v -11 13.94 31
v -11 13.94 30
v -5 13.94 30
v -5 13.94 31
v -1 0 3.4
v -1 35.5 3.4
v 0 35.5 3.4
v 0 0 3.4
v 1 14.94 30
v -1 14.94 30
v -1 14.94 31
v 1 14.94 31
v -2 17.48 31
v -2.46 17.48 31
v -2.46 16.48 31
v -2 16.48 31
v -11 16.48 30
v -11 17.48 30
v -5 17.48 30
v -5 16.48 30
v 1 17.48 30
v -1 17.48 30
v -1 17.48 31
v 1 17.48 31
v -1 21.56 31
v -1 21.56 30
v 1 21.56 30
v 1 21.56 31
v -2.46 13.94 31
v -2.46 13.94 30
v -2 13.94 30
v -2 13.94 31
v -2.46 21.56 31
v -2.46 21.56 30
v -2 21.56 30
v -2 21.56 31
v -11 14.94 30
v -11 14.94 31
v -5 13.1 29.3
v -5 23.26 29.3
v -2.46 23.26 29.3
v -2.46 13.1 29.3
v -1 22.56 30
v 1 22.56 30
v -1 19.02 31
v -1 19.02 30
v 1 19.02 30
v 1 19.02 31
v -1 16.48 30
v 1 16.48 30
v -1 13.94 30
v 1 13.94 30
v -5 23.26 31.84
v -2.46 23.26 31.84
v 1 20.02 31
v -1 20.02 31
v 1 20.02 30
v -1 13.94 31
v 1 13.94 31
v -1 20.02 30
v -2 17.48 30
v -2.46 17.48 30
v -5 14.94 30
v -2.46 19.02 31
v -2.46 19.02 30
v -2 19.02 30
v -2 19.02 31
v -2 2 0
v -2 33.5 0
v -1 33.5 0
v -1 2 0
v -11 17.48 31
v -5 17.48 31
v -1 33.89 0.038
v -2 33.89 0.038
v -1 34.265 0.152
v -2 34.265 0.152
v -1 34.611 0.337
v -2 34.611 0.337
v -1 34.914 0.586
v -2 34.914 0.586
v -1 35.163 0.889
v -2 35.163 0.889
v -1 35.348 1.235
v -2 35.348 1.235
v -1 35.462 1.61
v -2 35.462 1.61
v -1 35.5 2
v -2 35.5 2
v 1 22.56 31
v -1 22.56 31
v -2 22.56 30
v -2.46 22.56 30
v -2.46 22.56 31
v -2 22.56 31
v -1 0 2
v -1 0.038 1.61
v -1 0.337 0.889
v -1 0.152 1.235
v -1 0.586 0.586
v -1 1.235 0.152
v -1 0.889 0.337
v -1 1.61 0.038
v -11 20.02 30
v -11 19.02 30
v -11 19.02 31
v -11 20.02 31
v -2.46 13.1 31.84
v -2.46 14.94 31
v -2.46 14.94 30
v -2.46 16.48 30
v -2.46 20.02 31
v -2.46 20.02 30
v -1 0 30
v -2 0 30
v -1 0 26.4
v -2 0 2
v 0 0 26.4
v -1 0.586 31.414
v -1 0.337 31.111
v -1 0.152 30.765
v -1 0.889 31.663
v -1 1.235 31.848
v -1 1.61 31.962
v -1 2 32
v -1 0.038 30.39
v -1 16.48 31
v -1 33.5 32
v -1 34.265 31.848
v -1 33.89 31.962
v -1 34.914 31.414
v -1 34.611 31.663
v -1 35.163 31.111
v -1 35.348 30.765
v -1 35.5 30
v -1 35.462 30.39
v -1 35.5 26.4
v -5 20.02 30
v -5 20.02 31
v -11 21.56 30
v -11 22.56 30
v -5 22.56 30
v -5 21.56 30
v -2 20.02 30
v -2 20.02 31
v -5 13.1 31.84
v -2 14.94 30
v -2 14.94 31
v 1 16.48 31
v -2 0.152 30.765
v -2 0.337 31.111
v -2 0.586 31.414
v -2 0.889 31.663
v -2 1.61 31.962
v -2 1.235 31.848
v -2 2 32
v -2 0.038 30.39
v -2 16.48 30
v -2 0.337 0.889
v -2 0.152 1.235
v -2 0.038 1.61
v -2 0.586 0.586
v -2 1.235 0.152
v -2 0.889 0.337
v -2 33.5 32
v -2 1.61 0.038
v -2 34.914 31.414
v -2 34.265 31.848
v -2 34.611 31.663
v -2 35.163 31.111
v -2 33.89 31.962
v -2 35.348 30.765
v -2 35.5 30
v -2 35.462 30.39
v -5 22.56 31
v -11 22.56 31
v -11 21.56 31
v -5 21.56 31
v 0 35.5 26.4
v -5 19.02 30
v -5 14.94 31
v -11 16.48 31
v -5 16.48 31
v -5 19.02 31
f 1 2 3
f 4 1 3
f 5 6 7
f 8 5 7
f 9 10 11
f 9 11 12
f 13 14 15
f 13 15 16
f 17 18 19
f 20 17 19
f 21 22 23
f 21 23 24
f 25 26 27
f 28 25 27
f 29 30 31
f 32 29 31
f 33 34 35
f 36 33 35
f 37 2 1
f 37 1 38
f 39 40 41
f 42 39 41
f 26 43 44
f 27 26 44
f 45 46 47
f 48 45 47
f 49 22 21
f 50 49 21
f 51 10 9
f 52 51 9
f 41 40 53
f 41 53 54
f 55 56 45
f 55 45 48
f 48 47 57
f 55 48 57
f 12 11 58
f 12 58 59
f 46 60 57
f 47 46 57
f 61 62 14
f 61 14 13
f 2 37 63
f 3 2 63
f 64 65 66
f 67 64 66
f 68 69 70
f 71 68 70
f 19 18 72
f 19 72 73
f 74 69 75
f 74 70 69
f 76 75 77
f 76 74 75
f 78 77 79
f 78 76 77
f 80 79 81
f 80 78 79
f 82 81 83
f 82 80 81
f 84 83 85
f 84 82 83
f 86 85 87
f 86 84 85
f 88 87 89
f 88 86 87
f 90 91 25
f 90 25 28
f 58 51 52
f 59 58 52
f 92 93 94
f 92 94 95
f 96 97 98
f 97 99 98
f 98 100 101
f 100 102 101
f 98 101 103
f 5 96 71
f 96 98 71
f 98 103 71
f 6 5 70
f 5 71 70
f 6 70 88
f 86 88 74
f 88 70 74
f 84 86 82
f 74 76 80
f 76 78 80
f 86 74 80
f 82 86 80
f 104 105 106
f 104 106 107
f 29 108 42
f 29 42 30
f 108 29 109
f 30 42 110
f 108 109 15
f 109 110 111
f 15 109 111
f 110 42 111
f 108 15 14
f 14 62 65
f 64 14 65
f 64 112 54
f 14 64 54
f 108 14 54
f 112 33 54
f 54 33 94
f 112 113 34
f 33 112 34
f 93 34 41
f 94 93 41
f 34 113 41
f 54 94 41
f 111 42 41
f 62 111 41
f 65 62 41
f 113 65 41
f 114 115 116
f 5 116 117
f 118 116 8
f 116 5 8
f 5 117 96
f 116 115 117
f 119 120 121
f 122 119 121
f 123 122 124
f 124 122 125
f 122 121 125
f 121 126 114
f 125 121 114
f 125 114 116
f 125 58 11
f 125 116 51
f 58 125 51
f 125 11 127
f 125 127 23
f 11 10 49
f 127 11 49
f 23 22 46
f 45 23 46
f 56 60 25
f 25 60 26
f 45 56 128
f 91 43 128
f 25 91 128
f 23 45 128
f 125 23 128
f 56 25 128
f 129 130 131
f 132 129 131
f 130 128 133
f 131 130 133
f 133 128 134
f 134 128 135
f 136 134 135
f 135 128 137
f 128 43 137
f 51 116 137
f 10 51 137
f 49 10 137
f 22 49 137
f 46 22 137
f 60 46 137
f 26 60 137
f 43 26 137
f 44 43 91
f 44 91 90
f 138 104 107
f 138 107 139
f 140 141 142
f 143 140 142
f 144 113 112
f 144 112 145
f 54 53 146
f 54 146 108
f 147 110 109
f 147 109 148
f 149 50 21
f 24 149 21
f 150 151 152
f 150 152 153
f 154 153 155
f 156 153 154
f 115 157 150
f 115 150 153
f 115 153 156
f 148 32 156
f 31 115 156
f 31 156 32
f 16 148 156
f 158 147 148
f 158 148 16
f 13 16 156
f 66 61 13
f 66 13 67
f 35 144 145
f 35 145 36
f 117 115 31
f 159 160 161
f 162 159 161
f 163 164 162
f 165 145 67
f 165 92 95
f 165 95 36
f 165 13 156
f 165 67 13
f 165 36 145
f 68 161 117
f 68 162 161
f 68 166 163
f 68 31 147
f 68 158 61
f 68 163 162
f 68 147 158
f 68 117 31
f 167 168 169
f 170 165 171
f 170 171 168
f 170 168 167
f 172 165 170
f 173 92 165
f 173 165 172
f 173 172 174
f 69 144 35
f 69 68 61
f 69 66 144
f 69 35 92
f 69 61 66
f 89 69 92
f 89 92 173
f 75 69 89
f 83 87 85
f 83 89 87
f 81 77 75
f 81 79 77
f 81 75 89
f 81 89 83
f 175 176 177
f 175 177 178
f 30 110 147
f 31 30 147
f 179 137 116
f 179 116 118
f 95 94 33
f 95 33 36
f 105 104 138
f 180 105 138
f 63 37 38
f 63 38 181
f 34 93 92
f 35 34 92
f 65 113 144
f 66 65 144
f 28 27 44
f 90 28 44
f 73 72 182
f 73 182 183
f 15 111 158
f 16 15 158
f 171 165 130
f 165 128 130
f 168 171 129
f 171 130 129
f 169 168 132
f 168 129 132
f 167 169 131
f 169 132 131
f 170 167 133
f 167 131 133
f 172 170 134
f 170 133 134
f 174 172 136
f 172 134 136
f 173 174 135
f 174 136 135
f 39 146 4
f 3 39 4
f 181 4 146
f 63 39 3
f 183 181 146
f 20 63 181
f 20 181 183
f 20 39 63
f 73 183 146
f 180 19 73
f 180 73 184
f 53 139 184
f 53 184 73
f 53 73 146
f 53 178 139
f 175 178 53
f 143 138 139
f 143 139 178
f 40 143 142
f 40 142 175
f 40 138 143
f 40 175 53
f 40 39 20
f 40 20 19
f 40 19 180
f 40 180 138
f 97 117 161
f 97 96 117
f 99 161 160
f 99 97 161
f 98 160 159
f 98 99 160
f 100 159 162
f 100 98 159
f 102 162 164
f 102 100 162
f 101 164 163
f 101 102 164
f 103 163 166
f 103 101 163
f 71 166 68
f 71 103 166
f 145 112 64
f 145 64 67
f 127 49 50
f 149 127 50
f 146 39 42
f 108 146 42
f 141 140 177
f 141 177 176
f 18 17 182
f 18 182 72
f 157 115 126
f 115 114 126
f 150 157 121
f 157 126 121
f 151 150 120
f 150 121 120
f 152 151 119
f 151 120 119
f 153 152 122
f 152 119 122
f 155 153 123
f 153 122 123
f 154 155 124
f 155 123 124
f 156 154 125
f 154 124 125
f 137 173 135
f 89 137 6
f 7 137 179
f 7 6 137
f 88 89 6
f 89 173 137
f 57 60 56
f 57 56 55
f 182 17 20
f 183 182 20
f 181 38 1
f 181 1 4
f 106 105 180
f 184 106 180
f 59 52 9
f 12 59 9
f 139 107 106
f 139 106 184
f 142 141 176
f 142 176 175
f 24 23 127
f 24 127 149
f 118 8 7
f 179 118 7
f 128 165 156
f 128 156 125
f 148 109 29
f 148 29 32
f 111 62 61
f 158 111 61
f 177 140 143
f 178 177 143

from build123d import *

# Parameters (mm, degrees)
BOX003001_W           = 2.54
BOX003001_H           = 2.54
BOX003001_DEPTH       = 2.54
BOX002001_W           = 12
BOX002001_H           = 1
BOX002001_DEPTH       = 1
BOX003001001_W        = 2.54
BOX003001001_H        = 2.54
BOX003001001_DEPTH    = 2.54
BOX002001001_W        = 12
BOX002001001_H        = 1
BOX002001001_DEPTH    = 1
BOX003001001001_W     = 2.54
BOX003001001001_H     = 2.54
BOX003001001001_DEPTH = 2.54
BOX002001001001_W     = 12
BOX002001001001_H     = 1
BOX002001001001_DEPTH = 1
BOX003_W              = 2.54
BOX003_H              = 2.54
BOX003_DEPTH          = 2.54
BOX002_W              = 12
BOX002_H              = 1
BOX002_DEPTH          = 1
BOX_W                 = 1
BOX_H                 = 35.5
BOX_DEPTH             = 32
FILLET_R              = 2
FILLET001_R           = 2
FILLET002_R           = 2
FILLET003_R           = 2
BOX001_W              = 1
BOX001_H              = 35.5
BOX001_DEPTH          = 23


with BuildPart() as housing001:
    # Box003001 → Box003001 (new body)
    with BuildSketch(Plane(origin=(-5, 13.1, 29.3), x_dir=(1, 0, 0), z_dir=(0, 0, 1))):
        with Locations((1.27, 1.27)):
            Rectangle(BOX003001_W, BOX003001_H)
    extrude(amount=BOX003001_DEPTH)


with BuildPart() as pin003:
    # Box002001 → Box002001 (new body)
    with BuildSketch(Plane(origin=(-11, 13.94, 30), x_dir=(1, 0, 0), z_dir=(0, 0, 1))):
        with Locations((6, 0.5)):
            Rectangle(BOX002001_W, BOX002001_H)
    extrude(amount=BOX002001_DEPTH)

    # Fusion001: union Housing001
    add(housing001.part)


with BuildPart() as pin003_1:
    # Fusion001 placement: moved
    add(pin003.part.moved(Location((0, 2.54, 0))))


with BuildPart() as housing002:
    # Box003001001 → Box003001001 (new body)
    with BuildSketch(Plane(origin=(-5, 13.1, 29.3), x_dir=(1, 0, 0), z_dir=(0, 0, 1))):
        with Locations((1.27, 1.27)):
            Rectangle(BOX003001001_W, BOX003001001_H)
    extrude(amount=BOX003001001_DEPTH)


with BuildPart() as pin004:
    # Box002001001 → Box002001001 (new body)
    with BuildSketch(Plane(origin=(-11, 13.94, 30), x_dir=(1, 0, 0), z_dir=(0, 0, 1))):
        with Locations((6, 0.5)):
            Rectangle(BOX002001001_W, BOX002001001_H)
    extrude(amount=BOX002001001_DEPTH)

    # Fusion001001: union Housing002
    add(housing002.part)


with BuildPart() as pin004_1:
    # Fusion001001 placement: moved
    add(pin004.part.moved(Location((0, 5.08, 0))))


with BuildPart() as housing003:
    # Box003001001001 → Box003001001001 (new body)
    with BuildSketch(Plane(origin=(-5, 13.1, 29.3), x_dir=(1, 0, 0), z_dir=(0, 0, 1))):
        with Locations((1.27, 1.27)):
            Rectangle(BOX003001001001_W, BOX003001001001_H)
    extrude(amount=BOX003001001001_DEPTH)


with BuildPart() as pin006:
    # Box002001001001 → Box002001001001 (new body)
    with BuildSketch(Plane(origin=(-11, 13.94, 30), x_dir=(1, 0, 0), z_dir=(0, 0, 1))):
        with Locations((6, 0.5)):
            Rectangle(BOX002001001001_W, BOX002001001001_H)
    extrude(amount=BOX002001001001_DEPTH)

    # Fusion001001001: union Housing003
    add(housing003.part)


with BuildPart() as pin006_1:
    # Fusion001001001 placement: moved
    add(pin006.part.moved(Location((0, 7.62, 0))))


with BuildPart() as housing:
    # Box003 → Box003 (new body)
    with BuildSketch(Plane(origin=(-5, 13.1, 29.3), x_dir=(1, 0, 0), z_dir=(0, 0, 1))):
        with Locations((1.27, 1.27)):
            Rectangle(BOX003_W, BOX003_H)
    extrude(amount=BOX003_DEPTH)


with BuildPart() as pins:
    # Box002 → Box002 (new body)
    with BuildSketch(Plane(origin=(-11, 13.94, 30), x_dir=(1, 0, 0), z_dir=(0, 0, 1))):
        with Locations((6, 0.5)):
            Rectangle(BOX002_W, BOX002_H)
    extrude(amount=BOX002_DEPTH)

    # Fusion: union Housing
    add(housing.part)

    # Fusion001001002: union Pin003, Pin004, Pin006
    add(pin003_1.part)
    add(pin004_1.part)
    add(pin006_1.part)


with BuildPart() as pcb:
    # Box → Box (new body)
    with BuildSketch(Plane(origin=(-2, 0, 0), x_dir=(1, 0, 0), z_dir=(0, 0, 1))):
        with Locations((0.5, 17.75)):
            Rectangle(BOX_W, BOX_H)
    extrude(amount=BOX_DEPTH)

    # Fillet
    fillet_edges = [pcb.edges().sort_by_distance(p)[0] for p in [
        (-1.5, 0, 32),
    ]]
    fillet(fillet_edges, radius=FILLET_R)

    # Fillet001
    fillet001_edges = [pcb.edges().sort_by_distance(p)[0] for p in [
        (-1.5, 35.5, 32),
    ]]
    fillet(fillet001_edges, radius=FILLET001_R)

    # Fillet002
    fillet002_edges = [pcb.edges().sort_by_distance(p)[0] for p in [
        (-1.5, 0, 0),
    ]]
    fillet(fillet002_edges, radius=FILLET002_R)

    # Fillet003
    fillet003_edges = [pcb.edges().sort_by_distance(p)[0] for p in [
        (-1.5, 35.5, 0),
    ]]
    fillet(fillet003_edges, radius=FILLET003_R)


with BuildPart() as lcd:
    # Box001 → Box001 (new body)
    with BuildSketch(Plane(origin=(-1, 0, 3.4), x_dir=(1, 0, 0), z_dir=(0, 0, 1))):
        with Locations((0.5, 17.75)):
            Rectangle(BOX001_W, BOX001_H)
    extrude(amount=BOX001_DEPTH)

    # Fusion001001003: union Pins, Pcb
    add(pins.part)
    add(pcb.part)


solid = lcd.part
